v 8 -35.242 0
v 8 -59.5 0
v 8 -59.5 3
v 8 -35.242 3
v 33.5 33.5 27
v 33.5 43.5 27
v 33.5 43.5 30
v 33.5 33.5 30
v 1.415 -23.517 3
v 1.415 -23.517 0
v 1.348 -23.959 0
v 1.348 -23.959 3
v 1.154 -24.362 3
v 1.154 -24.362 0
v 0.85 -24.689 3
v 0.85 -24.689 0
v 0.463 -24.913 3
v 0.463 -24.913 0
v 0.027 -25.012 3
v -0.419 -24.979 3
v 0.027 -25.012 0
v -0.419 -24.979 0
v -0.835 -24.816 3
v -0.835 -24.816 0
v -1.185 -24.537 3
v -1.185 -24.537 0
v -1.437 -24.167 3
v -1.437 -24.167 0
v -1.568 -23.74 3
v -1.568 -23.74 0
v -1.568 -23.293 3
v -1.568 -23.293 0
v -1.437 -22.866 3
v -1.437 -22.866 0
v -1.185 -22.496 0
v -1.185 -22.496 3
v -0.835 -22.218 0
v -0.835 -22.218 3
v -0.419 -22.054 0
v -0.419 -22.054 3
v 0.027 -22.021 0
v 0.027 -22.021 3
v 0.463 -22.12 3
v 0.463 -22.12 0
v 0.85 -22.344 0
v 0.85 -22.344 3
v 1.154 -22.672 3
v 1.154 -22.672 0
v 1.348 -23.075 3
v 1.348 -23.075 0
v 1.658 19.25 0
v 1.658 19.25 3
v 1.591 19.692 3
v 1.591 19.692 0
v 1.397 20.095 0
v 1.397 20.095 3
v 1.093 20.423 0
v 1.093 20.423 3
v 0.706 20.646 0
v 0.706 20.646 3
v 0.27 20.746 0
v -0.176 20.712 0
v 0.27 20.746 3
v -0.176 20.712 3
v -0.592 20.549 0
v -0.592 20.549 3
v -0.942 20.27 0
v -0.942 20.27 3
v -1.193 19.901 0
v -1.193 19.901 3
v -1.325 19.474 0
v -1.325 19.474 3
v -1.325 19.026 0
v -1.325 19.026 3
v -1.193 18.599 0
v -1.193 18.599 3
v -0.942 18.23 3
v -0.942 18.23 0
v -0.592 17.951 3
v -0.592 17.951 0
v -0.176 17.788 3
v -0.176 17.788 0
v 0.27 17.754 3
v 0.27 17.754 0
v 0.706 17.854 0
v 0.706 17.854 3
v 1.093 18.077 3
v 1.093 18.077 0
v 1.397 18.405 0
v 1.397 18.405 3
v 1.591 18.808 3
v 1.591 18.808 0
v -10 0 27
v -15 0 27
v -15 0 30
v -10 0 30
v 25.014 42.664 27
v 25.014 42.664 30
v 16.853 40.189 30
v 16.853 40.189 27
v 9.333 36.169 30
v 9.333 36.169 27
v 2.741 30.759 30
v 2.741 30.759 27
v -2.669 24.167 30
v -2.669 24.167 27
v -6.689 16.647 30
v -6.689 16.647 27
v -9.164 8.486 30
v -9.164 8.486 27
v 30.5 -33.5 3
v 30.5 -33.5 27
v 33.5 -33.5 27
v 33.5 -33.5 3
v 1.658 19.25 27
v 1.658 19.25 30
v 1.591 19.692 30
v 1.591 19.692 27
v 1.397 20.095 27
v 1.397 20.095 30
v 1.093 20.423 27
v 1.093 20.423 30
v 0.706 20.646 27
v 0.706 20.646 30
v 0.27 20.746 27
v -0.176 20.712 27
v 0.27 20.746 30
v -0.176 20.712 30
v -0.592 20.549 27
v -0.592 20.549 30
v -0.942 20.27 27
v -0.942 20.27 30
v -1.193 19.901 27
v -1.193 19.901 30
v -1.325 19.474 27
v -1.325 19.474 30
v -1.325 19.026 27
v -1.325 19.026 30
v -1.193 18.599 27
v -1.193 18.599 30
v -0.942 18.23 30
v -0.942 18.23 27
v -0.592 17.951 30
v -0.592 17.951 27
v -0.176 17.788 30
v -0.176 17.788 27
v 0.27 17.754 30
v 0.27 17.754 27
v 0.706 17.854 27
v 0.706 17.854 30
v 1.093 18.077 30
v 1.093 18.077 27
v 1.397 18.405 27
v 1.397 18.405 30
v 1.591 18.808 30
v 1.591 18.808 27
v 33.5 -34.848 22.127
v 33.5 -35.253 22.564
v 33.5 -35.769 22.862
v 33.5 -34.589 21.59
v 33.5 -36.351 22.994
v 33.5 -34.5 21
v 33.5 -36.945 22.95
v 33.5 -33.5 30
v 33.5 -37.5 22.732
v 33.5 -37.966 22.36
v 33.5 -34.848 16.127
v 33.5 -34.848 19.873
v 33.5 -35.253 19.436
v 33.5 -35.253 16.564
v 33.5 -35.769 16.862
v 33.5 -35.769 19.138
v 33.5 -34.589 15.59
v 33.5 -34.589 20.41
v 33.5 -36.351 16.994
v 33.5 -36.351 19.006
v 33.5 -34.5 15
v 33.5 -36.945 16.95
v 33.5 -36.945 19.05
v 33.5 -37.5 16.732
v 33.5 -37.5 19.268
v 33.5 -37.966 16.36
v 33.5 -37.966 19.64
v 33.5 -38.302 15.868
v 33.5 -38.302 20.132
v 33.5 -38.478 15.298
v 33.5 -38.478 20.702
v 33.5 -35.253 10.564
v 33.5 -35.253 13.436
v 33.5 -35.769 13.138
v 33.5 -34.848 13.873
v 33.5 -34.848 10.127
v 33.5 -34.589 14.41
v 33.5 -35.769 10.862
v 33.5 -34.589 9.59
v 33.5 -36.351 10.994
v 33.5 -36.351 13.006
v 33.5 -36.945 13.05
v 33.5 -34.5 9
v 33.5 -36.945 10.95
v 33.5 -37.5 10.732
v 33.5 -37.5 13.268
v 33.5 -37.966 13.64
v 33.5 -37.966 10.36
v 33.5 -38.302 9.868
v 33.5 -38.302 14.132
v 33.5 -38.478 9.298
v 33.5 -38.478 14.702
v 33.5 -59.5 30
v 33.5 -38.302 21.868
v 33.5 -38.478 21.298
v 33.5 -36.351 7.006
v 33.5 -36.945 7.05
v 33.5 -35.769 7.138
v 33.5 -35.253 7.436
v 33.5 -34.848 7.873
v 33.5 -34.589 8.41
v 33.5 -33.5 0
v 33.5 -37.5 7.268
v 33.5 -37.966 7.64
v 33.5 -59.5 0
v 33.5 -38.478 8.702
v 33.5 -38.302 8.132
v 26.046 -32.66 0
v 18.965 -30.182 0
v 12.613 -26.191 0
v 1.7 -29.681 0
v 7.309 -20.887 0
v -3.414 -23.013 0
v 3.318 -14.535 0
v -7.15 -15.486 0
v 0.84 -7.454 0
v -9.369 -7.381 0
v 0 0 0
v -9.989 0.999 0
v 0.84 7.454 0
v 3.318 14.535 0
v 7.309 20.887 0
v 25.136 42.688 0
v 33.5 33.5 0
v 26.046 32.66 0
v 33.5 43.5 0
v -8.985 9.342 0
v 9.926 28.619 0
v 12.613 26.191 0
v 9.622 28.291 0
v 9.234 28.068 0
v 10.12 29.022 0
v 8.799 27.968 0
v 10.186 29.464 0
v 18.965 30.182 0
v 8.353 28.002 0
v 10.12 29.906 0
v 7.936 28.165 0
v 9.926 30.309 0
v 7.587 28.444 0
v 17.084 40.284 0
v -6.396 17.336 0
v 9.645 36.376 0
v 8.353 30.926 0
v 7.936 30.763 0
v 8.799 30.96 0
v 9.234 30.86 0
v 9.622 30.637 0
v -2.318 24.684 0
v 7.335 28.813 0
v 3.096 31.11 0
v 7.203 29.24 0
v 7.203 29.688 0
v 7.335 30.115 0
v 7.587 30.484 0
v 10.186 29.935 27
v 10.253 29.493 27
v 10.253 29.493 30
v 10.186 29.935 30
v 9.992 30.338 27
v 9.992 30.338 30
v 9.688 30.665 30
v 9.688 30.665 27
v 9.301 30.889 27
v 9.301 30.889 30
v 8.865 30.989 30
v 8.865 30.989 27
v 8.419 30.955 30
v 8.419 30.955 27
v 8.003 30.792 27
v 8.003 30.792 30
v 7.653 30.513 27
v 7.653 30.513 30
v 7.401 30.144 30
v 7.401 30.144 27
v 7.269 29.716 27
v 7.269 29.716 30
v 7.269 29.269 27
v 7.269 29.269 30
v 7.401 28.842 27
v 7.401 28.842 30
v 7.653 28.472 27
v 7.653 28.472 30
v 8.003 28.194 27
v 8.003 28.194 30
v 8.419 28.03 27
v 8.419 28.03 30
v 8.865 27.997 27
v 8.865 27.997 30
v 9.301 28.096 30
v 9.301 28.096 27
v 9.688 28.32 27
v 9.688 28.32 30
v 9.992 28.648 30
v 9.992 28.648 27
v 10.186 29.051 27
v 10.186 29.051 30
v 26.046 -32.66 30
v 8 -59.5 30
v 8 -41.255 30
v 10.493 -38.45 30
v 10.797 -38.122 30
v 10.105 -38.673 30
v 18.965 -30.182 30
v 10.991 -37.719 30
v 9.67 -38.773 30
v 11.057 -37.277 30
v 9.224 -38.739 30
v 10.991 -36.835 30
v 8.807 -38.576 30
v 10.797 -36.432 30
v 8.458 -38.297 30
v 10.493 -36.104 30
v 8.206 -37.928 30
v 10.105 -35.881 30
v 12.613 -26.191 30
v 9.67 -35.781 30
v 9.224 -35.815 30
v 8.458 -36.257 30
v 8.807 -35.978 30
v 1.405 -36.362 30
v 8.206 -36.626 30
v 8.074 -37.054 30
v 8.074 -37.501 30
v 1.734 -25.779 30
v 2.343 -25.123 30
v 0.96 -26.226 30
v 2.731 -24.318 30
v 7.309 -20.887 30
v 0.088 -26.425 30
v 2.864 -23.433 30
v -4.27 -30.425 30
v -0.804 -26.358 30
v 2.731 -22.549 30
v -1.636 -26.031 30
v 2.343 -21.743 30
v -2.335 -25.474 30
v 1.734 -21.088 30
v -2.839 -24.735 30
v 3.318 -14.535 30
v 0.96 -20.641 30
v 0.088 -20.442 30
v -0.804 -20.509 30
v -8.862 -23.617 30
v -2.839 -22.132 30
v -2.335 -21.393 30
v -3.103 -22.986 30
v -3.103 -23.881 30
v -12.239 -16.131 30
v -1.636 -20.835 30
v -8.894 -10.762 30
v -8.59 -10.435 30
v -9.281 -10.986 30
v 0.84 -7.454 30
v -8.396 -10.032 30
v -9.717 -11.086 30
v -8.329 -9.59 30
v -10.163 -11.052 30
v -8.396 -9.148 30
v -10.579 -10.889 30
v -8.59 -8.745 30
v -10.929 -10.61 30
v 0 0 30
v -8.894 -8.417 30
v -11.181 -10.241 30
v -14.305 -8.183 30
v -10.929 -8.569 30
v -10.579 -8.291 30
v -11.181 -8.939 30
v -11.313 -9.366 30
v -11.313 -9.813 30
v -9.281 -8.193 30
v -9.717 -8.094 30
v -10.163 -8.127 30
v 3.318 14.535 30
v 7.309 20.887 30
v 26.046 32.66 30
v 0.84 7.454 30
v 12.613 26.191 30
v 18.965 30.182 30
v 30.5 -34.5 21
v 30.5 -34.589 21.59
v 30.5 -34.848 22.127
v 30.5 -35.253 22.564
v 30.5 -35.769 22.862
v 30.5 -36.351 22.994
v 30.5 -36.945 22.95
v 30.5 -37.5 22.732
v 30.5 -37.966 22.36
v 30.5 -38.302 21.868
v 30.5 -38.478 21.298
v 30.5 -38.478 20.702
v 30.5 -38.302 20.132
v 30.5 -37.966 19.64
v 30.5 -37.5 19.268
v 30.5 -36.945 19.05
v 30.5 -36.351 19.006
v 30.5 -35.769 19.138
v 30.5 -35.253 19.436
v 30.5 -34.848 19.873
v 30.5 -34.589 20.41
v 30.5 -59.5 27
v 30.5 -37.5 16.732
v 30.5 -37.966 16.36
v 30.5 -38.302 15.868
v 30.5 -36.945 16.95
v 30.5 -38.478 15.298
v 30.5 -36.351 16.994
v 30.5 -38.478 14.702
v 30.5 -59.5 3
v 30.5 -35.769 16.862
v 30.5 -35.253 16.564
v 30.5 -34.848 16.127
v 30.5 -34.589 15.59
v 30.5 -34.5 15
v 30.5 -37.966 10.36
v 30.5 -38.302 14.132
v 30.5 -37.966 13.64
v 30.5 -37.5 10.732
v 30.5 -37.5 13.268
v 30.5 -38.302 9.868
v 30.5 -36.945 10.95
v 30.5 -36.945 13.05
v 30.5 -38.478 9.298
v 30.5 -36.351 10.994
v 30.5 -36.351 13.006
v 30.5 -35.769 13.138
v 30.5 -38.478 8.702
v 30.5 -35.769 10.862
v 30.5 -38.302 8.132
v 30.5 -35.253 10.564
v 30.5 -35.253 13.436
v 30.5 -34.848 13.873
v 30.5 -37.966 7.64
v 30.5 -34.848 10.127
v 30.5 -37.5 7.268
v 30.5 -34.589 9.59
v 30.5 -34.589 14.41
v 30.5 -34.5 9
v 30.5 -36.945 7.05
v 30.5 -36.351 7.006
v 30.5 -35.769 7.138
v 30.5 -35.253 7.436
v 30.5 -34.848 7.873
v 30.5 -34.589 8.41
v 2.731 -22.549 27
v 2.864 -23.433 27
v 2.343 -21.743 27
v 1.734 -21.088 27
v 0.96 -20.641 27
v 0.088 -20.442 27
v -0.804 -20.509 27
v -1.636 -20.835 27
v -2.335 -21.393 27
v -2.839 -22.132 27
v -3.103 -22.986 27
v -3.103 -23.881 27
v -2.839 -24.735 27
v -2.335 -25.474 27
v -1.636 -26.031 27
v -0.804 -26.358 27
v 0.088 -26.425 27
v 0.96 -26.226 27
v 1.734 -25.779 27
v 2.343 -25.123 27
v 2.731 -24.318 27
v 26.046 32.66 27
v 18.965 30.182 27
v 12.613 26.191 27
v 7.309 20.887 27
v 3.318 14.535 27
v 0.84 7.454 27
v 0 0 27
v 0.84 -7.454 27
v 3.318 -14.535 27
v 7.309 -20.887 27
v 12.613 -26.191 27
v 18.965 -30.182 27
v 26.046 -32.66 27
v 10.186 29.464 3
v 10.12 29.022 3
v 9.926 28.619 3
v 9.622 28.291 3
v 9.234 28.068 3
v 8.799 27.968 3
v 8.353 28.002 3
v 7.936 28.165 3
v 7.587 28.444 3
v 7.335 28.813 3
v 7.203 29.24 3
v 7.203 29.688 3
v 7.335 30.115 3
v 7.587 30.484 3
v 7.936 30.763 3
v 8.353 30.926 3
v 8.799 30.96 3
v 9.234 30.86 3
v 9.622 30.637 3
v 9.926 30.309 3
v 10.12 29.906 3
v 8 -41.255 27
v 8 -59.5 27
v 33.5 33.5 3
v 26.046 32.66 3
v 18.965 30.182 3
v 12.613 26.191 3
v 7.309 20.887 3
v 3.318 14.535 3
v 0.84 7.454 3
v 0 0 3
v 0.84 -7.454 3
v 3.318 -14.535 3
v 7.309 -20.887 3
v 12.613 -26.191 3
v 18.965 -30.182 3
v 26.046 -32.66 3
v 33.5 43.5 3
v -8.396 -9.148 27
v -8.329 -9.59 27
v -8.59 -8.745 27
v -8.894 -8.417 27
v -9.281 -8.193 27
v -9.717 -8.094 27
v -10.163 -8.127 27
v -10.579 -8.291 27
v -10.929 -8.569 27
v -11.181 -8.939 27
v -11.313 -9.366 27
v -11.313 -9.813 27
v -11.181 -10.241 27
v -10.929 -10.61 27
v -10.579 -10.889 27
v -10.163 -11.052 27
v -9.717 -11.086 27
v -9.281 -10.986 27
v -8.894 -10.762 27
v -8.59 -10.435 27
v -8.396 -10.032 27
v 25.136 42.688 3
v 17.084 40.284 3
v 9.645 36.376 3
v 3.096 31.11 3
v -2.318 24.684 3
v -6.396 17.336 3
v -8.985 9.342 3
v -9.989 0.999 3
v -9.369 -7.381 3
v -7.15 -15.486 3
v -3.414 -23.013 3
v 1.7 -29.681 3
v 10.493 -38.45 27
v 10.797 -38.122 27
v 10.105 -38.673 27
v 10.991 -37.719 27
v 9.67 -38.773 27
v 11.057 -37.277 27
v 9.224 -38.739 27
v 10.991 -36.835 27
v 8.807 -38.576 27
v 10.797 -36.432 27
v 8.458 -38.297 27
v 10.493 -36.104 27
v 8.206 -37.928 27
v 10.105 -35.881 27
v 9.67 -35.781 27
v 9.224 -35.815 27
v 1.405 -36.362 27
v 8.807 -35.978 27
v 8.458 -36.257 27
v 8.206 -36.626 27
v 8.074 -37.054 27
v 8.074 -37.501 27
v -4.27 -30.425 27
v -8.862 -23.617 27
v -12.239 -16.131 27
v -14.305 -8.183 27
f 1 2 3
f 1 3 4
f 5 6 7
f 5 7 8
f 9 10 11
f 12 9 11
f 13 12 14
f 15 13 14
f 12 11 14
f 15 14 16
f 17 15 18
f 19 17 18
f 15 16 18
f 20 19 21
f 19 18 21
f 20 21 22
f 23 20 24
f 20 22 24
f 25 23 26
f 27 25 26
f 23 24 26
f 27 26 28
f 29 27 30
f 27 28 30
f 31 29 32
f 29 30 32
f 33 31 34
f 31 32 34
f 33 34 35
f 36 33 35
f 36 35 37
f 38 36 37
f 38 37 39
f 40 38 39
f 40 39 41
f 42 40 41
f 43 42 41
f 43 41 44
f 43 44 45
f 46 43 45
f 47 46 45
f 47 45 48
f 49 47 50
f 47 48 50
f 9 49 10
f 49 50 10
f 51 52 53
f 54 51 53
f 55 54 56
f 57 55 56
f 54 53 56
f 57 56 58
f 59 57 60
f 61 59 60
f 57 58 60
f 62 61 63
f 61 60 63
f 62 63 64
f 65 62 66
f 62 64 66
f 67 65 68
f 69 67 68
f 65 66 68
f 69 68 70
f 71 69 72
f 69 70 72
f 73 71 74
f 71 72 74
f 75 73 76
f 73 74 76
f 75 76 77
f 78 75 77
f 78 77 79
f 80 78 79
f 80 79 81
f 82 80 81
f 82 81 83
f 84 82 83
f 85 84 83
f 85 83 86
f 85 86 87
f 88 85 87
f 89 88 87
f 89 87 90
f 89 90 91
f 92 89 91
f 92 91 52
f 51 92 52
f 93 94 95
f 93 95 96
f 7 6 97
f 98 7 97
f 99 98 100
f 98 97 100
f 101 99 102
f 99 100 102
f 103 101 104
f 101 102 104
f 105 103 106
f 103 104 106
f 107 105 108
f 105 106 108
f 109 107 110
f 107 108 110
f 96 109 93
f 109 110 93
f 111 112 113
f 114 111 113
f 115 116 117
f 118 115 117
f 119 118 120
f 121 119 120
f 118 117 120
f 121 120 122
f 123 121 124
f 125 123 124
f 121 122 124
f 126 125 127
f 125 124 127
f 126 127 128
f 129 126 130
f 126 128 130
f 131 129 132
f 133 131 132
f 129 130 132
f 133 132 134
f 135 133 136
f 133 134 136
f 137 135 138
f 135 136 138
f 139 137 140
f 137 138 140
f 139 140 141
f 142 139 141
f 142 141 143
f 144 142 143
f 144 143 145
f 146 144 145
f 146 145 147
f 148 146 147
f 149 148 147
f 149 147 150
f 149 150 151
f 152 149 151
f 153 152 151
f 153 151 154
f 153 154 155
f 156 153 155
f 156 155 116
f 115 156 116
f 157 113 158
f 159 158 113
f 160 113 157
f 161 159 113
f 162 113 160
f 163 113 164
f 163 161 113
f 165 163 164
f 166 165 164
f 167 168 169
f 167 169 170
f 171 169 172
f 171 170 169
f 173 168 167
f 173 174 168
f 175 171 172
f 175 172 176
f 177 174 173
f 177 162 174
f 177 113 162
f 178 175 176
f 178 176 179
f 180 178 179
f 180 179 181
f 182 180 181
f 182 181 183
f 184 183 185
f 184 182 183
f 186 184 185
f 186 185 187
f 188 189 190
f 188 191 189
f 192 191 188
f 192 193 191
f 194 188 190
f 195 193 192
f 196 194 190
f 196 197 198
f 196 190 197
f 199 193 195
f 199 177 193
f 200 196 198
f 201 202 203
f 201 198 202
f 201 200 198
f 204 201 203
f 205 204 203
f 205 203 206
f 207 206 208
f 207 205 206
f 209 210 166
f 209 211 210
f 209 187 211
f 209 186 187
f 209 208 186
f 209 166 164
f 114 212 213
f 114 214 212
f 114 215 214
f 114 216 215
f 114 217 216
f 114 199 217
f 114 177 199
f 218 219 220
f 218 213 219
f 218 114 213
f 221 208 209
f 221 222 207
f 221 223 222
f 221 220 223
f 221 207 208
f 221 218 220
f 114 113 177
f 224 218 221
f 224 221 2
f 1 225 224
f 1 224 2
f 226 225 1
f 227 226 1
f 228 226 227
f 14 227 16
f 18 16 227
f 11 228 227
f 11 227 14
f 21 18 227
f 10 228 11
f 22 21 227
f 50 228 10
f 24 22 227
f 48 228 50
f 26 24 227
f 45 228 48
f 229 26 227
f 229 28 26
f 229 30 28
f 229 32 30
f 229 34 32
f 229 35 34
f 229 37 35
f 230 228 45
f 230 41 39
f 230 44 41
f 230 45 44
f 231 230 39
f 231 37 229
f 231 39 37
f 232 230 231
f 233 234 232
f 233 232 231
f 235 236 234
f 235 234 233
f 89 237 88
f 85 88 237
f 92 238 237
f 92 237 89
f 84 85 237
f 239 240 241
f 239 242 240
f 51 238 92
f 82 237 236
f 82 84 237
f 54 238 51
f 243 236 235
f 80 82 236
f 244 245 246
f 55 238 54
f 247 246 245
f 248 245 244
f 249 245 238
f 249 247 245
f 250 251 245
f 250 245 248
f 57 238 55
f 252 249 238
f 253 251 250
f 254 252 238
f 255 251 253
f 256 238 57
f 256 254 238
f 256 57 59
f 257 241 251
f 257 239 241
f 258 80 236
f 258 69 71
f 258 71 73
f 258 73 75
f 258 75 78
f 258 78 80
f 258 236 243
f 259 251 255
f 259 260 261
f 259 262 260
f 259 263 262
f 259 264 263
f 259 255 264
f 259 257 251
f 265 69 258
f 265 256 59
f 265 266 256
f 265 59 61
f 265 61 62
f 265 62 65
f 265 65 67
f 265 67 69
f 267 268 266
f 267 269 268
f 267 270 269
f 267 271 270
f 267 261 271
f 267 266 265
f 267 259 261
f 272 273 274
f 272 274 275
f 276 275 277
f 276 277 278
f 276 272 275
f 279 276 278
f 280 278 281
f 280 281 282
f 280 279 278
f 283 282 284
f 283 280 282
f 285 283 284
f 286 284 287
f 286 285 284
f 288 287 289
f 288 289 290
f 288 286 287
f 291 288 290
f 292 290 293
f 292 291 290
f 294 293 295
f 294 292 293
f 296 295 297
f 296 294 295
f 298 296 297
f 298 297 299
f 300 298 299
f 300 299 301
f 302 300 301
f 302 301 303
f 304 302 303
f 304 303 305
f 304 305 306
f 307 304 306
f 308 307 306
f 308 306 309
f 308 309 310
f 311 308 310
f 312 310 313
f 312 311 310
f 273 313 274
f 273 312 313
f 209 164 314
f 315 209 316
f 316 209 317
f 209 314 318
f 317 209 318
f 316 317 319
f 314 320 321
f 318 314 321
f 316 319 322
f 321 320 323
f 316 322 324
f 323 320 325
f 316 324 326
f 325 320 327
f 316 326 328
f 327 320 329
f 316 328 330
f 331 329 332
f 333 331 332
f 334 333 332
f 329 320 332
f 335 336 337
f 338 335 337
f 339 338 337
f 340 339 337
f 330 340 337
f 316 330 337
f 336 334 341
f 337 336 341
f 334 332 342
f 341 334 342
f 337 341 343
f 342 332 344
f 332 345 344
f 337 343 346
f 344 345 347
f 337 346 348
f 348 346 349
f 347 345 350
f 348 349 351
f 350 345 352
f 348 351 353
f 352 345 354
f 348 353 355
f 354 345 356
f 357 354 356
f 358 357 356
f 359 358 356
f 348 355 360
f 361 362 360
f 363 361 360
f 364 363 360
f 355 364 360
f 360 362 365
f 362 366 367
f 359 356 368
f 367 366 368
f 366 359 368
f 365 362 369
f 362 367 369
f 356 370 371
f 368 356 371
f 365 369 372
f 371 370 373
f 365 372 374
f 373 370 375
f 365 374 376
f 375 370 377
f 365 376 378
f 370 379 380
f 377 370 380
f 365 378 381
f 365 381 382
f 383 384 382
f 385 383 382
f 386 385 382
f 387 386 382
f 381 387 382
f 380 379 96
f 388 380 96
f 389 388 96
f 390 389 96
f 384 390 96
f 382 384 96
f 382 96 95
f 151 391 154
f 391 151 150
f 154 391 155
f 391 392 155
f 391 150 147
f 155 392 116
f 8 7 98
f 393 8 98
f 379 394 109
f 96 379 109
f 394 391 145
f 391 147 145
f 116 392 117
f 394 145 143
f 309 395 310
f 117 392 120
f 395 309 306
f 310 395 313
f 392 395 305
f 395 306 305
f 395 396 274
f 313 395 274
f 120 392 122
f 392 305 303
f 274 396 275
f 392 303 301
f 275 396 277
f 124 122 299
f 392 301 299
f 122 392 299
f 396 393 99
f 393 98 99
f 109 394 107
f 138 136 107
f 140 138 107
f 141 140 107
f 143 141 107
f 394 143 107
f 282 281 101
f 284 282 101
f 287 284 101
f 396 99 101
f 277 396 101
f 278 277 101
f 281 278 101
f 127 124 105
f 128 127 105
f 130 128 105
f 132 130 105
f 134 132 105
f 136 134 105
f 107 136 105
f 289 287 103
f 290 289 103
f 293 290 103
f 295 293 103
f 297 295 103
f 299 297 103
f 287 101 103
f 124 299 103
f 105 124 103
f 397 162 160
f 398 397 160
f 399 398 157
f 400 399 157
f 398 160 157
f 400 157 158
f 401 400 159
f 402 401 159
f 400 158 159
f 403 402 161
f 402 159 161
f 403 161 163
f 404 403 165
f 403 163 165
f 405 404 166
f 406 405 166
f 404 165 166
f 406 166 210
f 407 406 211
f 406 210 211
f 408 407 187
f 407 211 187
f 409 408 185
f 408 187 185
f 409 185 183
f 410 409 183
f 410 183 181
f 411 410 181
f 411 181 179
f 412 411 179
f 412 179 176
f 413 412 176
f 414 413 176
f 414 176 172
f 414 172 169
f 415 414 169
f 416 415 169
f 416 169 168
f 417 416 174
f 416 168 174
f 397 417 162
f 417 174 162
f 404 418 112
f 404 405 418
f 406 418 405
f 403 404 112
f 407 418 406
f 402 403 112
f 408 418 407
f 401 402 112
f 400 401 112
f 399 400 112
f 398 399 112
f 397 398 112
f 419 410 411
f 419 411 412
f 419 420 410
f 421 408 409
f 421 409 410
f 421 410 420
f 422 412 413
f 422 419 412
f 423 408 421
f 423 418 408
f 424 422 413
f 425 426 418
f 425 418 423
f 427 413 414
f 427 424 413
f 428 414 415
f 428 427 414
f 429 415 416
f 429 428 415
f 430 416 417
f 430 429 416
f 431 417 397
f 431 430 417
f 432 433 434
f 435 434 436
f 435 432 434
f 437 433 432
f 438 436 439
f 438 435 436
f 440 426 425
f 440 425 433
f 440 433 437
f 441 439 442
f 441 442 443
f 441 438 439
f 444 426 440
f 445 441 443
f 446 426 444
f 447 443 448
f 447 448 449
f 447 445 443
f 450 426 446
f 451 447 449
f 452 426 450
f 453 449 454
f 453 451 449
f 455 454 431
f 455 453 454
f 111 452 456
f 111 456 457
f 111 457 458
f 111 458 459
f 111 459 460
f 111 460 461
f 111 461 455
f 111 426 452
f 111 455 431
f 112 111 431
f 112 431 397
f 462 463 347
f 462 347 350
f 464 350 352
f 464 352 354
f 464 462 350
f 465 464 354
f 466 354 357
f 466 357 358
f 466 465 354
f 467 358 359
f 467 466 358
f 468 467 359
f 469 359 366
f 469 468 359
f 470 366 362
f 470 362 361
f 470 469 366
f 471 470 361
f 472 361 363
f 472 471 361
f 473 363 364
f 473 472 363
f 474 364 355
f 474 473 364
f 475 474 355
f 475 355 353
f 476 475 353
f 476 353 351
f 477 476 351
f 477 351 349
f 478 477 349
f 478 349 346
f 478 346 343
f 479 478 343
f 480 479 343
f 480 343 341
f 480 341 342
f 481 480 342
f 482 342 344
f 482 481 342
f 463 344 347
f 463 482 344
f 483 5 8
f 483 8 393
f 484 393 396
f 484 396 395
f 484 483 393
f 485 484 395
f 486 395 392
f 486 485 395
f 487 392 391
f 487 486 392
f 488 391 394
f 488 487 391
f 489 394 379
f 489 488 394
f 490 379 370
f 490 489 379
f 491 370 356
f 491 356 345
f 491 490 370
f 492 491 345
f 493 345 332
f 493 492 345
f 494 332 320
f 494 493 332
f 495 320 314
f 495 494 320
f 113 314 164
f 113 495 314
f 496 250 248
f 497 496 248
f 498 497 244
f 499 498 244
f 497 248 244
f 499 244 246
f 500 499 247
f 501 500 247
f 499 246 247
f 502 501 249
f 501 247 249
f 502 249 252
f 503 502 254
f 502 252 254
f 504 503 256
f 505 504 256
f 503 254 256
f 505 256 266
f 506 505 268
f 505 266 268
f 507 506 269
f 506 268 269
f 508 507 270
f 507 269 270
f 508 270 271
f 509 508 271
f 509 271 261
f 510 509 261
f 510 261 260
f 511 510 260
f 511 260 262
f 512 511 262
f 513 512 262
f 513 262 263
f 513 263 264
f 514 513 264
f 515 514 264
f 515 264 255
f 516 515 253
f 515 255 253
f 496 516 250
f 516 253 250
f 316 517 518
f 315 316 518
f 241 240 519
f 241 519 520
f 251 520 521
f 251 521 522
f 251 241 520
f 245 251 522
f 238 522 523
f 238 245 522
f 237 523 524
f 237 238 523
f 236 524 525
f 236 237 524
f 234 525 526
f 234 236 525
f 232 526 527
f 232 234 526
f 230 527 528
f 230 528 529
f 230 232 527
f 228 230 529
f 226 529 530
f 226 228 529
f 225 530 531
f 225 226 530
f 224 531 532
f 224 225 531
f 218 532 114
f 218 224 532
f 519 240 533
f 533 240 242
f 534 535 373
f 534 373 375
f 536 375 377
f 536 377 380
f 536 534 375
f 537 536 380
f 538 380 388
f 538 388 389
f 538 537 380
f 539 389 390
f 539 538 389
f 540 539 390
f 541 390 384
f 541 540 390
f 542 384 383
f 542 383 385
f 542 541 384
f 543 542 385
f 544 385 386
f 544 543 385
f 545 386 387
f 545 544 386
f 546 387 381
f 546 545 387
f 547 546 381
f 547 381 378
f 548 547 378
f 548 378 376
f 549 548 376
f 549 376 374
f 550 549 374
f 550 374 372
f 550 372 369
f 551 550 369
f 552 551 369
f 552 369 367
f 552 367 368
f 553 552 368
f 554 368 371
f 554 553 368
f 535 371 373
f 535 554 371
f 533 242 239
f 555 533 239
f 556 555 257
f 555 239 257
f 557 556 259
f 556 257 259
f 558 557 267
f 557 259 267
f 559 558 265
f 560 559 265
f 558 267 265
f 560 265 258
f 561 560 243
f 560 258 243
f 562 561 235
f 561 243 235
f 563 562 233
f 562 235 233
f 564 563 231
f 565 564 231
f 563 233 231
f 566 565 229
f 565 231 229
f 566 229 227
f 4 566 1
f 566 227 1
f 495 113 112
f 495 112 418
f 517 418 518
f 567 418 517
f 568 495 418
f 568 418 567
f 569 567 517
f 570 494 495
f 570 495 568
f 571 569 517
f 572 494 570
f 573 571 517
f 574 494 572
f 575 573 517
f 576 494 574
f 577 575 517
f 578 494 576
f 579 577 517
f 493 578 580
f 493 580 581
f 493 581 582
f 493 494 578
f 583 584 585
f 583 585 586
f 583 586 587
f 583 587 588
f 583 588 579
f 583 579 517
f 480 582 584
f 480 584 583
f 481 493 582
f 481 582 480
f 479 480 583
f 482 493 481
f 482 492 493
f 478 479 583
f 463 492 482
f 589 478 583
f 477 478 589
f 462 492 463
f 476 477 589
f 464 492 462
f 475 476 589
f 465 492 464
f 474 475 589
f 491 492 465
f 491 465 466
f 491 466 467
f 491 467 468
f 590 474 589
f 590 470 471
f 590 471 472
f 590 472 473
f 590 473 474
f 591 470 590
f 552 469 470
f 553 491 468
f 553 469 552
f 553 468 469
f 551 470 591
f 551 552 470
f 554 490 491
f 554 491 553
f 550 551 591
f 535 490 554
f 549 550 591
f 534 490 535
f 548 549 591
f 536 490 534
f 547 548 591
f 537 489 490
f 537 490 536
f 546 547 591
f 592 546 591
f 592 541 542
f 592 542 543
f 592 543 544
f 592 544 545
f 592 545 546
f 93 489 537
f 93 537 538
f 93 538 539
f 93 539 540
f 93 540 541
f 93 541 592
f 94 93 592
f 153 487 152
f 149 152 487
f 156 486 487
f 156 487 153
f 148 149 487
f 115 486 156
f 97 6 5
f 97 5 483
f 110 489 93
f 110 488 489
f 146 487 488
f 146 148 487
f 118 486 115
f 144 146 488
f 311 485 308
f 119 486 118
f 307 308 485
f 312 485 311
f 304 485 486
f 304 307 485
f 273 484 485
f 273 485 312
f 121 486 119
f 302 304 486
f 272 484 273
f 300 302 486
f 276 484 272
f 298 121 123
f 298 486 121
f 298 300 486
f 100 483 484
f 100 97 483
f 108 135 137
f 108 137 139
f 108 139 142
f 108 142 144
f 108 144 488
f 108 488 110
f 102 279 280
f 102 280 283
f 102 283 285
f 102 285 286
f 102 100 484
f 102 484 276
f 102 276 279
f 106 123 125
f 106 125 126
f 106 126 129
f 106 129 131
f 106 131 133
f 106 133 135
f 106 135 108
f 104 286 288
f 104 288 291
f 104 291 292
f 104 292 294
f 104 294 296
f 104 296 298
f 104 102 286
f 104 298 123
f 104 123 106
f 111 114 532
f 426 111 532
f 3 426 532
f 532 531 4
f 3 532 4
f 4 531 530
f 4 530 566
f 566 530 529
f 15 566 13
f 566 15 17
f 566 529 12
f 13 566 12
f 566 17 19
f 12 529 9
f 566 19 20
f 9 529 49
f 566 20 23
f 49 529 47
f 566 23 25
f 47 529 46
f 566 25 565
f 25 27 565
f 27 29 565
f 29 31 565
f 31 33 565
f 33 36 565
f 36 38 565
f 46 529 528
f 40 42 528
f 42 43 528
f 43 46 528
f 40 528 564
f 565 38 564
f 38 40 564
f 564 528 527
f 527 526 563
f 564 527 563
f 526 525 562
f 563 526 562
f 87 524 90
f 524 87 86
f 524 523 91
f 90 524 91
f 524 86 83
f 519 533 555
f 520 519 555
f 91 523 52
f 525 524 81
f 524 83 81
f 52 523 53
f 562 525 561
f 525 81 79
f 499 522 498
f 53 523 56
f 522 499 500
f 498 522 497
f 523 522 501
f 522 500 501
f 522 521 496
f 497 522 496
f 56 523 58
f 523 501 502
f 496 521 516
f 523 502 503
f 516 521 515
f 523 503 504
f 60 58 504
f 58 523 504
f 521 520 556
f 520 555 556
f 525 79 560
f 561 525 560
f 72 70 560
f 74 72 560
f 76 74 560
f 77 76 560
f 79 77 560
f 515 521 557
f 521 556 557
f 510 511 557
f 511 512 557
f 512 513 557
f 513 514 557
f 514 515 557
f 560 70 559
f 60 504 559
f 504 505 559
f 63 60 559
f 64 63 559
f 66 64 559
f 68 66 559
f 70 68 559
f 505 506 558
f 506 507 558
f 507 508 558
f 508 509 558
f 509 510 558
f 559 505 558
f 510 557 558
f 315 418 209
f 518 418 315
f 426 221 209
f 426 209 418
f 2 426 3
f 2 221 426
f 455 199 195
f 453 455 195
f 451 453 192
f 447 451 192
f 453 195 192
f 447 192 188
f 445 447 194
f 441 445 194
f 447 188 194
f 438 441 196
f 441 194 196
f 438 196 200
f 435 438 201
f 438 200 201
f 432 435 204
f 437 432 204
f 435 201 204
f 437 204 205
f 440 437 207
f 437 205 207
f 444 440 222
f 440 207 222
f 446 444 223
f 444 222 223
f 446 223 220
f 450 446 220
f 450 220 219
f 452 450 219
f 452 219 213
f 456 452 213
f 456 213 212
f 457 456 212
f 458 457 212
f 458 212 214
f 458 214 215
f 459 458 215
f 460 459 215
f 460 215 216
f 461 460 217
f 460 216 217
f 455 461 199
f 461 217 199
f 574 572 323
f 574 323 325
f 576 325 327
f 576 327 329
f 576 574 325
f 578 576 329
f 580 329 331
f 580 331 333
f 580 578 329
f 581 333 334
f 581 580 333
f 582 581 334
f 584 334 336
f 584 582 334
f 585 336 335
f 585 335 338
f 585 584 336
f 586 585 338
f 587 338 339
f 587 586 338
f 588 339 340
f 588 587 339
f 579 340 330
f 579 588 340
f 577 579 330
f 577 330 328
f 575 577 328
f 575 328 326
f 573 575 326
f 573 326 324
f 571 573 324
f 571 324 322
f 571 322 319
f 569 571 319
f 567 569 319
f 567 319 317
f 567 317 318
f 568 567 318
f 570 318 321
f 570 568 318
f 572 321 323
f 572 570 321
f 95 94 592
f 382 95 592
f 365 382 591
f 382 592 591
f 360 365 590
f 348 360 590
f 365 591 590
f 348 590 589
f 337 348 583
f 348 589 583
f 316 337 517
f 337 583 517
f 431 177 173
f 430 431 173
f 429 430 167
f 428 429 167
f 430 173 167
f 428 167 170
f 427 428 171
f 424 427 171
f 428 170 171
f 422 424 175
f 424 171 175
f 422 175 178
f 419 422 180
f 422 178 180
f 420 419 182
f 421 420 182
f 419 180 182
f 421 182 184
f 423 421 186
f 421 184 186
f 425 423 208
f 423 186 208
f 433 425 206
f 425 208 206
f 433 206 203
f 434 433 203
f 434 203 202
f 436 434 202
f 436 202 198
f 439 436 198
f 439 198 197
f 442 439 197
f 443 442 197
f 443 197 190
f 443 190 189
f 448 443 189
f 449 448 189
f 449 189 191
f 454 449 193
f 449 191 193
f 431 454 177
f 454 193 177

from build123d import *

# Parameters (mm, degrees)
PAD_DEPTH       = 3
SKETCH001_W     = 3
SKETCH001_H     = 26
PAD001_DEPTH    = 24
SKETCH002_R     = 2
POCKET_DEPTH    = 3
SKETCH003_R     = 1.5
SKETCH003_R_2   = 3
PAD002_DEPTH    = 3
SKETCH004_R     = 1.5
POCKET001_DEPTH = 3
SKETCH005_R     = 1.5
POCKET002_DEPTH = 30.001


with BuildPart() as part:
    # Sketch → Pad (new body)
    with BuildSketch(Plane.XY):
        with BuildLine():
            ThreePointArc((33.5, 33.5), (0, 0), (33.5, -33.5))
            Line((33.5, -33.5), (33.5, -59.5))
            Line((33.5, -59.5), (8, -59.5))
            Line((8, -59.5), (8, -35.24202))
            ThreePointArc((33.5, 43.5), (-7.884042, 13.401905), (8, -35.24202))
            Line((33.5, 33.5), (33.5, 43.5))
        make_face()
    extrude(amount=PAD_DEPTH)

    # Sketch001 → Pad001 (new body)
    with BuildSketch(Plane.XY.offset(3)):
        with Locations((32, -46.5)):
            Rectangle(SKETCH001_W, SKETCH001_H)
    extrude(amount=PAD001_DEPTH)

    # Sketch002 → Pocket (cut)
    with BuildSketch(Plane.YZ.offset(33.5)):
        with Locations((-36.5, 21)):
            Circle(SKETCH002_R)
        with Locations((-36.5, 15)):
            Circle(SKETCH002_R)
        with Locations((-36.5, 9)):
            Circle(SKETCH002_R)
    extrude(amount=-POCKET_DEPTH, mode=Mode.SUBTRACT)

    # Sketch003 → Pad002 (new body)
    with BuildSketch(Plane.XY.offset(27)):
        with BuildLine():
            Line((33.5, 43.5), (33.5, 33.5))
            ThreePointArc((33.5, 33.5), (0, 0), (33.5, -33.5))
            Line((33.5, -33.5), (33.5, -59.5))
            Line((33.5, -59.5), (8, -59.5))
            Line((8, -41.255303), (8, -59.5))
            ThreePointArc((-15, 0), (-8.861539, -23.616731), (8, -41.255303))
            Line((-15, 0), (-10, 0))
            ThreePointArc((33.5, 43.5), (2.740855, 30.759145), (-10, 0))
        make_face()
        with Locations((8.752677, 29.492711)):
            Circle(SKETCH003_R, mode=Mode.SUBTRACT)
        with Locations((-0.136024, -23.4334)):
            Circle(SKETCH003_R_2, mode=Mode.SUBTRACT)
        with Locations((-9.829466, -9.58973)):
            Circle(SKETCH003_R, mode=Mode.SUBTRACT)
        with Locations((9.557418, -37.27707)):
            Circle(SKETCH003_R, mode=Mode.SUBTRACT)
    extrude(amount=PAD002_DEPTH)

    # Sketch004 → Pocket001 (cut)
    with BuildSketch(Plane(origin=(0, 0, 0), x_dir=(1, 0, 0), z_dir=(0, 0, -1))):
        with Locations((8.68646, -29.464001)):
            Circle(SKETCH004_R)
        with Locations((-0.085234, 23.516634)):
            Circle(SKETCH004_R)
    extrude(amount=-POCKET001_DEPTH, mode=Mode.SUBTRACT)

    # Sketch005 → Pocket002 (cut, through all)
    with BuildSketch(Plane.XY.offset(30)):
        with Locations((0.158022, 19.25)):
            Circle(SKETCH005_R)
    extrude(amount=-POCKET002_DEPTH, mode=Mode.SUBTRACT)


solid = part.part
